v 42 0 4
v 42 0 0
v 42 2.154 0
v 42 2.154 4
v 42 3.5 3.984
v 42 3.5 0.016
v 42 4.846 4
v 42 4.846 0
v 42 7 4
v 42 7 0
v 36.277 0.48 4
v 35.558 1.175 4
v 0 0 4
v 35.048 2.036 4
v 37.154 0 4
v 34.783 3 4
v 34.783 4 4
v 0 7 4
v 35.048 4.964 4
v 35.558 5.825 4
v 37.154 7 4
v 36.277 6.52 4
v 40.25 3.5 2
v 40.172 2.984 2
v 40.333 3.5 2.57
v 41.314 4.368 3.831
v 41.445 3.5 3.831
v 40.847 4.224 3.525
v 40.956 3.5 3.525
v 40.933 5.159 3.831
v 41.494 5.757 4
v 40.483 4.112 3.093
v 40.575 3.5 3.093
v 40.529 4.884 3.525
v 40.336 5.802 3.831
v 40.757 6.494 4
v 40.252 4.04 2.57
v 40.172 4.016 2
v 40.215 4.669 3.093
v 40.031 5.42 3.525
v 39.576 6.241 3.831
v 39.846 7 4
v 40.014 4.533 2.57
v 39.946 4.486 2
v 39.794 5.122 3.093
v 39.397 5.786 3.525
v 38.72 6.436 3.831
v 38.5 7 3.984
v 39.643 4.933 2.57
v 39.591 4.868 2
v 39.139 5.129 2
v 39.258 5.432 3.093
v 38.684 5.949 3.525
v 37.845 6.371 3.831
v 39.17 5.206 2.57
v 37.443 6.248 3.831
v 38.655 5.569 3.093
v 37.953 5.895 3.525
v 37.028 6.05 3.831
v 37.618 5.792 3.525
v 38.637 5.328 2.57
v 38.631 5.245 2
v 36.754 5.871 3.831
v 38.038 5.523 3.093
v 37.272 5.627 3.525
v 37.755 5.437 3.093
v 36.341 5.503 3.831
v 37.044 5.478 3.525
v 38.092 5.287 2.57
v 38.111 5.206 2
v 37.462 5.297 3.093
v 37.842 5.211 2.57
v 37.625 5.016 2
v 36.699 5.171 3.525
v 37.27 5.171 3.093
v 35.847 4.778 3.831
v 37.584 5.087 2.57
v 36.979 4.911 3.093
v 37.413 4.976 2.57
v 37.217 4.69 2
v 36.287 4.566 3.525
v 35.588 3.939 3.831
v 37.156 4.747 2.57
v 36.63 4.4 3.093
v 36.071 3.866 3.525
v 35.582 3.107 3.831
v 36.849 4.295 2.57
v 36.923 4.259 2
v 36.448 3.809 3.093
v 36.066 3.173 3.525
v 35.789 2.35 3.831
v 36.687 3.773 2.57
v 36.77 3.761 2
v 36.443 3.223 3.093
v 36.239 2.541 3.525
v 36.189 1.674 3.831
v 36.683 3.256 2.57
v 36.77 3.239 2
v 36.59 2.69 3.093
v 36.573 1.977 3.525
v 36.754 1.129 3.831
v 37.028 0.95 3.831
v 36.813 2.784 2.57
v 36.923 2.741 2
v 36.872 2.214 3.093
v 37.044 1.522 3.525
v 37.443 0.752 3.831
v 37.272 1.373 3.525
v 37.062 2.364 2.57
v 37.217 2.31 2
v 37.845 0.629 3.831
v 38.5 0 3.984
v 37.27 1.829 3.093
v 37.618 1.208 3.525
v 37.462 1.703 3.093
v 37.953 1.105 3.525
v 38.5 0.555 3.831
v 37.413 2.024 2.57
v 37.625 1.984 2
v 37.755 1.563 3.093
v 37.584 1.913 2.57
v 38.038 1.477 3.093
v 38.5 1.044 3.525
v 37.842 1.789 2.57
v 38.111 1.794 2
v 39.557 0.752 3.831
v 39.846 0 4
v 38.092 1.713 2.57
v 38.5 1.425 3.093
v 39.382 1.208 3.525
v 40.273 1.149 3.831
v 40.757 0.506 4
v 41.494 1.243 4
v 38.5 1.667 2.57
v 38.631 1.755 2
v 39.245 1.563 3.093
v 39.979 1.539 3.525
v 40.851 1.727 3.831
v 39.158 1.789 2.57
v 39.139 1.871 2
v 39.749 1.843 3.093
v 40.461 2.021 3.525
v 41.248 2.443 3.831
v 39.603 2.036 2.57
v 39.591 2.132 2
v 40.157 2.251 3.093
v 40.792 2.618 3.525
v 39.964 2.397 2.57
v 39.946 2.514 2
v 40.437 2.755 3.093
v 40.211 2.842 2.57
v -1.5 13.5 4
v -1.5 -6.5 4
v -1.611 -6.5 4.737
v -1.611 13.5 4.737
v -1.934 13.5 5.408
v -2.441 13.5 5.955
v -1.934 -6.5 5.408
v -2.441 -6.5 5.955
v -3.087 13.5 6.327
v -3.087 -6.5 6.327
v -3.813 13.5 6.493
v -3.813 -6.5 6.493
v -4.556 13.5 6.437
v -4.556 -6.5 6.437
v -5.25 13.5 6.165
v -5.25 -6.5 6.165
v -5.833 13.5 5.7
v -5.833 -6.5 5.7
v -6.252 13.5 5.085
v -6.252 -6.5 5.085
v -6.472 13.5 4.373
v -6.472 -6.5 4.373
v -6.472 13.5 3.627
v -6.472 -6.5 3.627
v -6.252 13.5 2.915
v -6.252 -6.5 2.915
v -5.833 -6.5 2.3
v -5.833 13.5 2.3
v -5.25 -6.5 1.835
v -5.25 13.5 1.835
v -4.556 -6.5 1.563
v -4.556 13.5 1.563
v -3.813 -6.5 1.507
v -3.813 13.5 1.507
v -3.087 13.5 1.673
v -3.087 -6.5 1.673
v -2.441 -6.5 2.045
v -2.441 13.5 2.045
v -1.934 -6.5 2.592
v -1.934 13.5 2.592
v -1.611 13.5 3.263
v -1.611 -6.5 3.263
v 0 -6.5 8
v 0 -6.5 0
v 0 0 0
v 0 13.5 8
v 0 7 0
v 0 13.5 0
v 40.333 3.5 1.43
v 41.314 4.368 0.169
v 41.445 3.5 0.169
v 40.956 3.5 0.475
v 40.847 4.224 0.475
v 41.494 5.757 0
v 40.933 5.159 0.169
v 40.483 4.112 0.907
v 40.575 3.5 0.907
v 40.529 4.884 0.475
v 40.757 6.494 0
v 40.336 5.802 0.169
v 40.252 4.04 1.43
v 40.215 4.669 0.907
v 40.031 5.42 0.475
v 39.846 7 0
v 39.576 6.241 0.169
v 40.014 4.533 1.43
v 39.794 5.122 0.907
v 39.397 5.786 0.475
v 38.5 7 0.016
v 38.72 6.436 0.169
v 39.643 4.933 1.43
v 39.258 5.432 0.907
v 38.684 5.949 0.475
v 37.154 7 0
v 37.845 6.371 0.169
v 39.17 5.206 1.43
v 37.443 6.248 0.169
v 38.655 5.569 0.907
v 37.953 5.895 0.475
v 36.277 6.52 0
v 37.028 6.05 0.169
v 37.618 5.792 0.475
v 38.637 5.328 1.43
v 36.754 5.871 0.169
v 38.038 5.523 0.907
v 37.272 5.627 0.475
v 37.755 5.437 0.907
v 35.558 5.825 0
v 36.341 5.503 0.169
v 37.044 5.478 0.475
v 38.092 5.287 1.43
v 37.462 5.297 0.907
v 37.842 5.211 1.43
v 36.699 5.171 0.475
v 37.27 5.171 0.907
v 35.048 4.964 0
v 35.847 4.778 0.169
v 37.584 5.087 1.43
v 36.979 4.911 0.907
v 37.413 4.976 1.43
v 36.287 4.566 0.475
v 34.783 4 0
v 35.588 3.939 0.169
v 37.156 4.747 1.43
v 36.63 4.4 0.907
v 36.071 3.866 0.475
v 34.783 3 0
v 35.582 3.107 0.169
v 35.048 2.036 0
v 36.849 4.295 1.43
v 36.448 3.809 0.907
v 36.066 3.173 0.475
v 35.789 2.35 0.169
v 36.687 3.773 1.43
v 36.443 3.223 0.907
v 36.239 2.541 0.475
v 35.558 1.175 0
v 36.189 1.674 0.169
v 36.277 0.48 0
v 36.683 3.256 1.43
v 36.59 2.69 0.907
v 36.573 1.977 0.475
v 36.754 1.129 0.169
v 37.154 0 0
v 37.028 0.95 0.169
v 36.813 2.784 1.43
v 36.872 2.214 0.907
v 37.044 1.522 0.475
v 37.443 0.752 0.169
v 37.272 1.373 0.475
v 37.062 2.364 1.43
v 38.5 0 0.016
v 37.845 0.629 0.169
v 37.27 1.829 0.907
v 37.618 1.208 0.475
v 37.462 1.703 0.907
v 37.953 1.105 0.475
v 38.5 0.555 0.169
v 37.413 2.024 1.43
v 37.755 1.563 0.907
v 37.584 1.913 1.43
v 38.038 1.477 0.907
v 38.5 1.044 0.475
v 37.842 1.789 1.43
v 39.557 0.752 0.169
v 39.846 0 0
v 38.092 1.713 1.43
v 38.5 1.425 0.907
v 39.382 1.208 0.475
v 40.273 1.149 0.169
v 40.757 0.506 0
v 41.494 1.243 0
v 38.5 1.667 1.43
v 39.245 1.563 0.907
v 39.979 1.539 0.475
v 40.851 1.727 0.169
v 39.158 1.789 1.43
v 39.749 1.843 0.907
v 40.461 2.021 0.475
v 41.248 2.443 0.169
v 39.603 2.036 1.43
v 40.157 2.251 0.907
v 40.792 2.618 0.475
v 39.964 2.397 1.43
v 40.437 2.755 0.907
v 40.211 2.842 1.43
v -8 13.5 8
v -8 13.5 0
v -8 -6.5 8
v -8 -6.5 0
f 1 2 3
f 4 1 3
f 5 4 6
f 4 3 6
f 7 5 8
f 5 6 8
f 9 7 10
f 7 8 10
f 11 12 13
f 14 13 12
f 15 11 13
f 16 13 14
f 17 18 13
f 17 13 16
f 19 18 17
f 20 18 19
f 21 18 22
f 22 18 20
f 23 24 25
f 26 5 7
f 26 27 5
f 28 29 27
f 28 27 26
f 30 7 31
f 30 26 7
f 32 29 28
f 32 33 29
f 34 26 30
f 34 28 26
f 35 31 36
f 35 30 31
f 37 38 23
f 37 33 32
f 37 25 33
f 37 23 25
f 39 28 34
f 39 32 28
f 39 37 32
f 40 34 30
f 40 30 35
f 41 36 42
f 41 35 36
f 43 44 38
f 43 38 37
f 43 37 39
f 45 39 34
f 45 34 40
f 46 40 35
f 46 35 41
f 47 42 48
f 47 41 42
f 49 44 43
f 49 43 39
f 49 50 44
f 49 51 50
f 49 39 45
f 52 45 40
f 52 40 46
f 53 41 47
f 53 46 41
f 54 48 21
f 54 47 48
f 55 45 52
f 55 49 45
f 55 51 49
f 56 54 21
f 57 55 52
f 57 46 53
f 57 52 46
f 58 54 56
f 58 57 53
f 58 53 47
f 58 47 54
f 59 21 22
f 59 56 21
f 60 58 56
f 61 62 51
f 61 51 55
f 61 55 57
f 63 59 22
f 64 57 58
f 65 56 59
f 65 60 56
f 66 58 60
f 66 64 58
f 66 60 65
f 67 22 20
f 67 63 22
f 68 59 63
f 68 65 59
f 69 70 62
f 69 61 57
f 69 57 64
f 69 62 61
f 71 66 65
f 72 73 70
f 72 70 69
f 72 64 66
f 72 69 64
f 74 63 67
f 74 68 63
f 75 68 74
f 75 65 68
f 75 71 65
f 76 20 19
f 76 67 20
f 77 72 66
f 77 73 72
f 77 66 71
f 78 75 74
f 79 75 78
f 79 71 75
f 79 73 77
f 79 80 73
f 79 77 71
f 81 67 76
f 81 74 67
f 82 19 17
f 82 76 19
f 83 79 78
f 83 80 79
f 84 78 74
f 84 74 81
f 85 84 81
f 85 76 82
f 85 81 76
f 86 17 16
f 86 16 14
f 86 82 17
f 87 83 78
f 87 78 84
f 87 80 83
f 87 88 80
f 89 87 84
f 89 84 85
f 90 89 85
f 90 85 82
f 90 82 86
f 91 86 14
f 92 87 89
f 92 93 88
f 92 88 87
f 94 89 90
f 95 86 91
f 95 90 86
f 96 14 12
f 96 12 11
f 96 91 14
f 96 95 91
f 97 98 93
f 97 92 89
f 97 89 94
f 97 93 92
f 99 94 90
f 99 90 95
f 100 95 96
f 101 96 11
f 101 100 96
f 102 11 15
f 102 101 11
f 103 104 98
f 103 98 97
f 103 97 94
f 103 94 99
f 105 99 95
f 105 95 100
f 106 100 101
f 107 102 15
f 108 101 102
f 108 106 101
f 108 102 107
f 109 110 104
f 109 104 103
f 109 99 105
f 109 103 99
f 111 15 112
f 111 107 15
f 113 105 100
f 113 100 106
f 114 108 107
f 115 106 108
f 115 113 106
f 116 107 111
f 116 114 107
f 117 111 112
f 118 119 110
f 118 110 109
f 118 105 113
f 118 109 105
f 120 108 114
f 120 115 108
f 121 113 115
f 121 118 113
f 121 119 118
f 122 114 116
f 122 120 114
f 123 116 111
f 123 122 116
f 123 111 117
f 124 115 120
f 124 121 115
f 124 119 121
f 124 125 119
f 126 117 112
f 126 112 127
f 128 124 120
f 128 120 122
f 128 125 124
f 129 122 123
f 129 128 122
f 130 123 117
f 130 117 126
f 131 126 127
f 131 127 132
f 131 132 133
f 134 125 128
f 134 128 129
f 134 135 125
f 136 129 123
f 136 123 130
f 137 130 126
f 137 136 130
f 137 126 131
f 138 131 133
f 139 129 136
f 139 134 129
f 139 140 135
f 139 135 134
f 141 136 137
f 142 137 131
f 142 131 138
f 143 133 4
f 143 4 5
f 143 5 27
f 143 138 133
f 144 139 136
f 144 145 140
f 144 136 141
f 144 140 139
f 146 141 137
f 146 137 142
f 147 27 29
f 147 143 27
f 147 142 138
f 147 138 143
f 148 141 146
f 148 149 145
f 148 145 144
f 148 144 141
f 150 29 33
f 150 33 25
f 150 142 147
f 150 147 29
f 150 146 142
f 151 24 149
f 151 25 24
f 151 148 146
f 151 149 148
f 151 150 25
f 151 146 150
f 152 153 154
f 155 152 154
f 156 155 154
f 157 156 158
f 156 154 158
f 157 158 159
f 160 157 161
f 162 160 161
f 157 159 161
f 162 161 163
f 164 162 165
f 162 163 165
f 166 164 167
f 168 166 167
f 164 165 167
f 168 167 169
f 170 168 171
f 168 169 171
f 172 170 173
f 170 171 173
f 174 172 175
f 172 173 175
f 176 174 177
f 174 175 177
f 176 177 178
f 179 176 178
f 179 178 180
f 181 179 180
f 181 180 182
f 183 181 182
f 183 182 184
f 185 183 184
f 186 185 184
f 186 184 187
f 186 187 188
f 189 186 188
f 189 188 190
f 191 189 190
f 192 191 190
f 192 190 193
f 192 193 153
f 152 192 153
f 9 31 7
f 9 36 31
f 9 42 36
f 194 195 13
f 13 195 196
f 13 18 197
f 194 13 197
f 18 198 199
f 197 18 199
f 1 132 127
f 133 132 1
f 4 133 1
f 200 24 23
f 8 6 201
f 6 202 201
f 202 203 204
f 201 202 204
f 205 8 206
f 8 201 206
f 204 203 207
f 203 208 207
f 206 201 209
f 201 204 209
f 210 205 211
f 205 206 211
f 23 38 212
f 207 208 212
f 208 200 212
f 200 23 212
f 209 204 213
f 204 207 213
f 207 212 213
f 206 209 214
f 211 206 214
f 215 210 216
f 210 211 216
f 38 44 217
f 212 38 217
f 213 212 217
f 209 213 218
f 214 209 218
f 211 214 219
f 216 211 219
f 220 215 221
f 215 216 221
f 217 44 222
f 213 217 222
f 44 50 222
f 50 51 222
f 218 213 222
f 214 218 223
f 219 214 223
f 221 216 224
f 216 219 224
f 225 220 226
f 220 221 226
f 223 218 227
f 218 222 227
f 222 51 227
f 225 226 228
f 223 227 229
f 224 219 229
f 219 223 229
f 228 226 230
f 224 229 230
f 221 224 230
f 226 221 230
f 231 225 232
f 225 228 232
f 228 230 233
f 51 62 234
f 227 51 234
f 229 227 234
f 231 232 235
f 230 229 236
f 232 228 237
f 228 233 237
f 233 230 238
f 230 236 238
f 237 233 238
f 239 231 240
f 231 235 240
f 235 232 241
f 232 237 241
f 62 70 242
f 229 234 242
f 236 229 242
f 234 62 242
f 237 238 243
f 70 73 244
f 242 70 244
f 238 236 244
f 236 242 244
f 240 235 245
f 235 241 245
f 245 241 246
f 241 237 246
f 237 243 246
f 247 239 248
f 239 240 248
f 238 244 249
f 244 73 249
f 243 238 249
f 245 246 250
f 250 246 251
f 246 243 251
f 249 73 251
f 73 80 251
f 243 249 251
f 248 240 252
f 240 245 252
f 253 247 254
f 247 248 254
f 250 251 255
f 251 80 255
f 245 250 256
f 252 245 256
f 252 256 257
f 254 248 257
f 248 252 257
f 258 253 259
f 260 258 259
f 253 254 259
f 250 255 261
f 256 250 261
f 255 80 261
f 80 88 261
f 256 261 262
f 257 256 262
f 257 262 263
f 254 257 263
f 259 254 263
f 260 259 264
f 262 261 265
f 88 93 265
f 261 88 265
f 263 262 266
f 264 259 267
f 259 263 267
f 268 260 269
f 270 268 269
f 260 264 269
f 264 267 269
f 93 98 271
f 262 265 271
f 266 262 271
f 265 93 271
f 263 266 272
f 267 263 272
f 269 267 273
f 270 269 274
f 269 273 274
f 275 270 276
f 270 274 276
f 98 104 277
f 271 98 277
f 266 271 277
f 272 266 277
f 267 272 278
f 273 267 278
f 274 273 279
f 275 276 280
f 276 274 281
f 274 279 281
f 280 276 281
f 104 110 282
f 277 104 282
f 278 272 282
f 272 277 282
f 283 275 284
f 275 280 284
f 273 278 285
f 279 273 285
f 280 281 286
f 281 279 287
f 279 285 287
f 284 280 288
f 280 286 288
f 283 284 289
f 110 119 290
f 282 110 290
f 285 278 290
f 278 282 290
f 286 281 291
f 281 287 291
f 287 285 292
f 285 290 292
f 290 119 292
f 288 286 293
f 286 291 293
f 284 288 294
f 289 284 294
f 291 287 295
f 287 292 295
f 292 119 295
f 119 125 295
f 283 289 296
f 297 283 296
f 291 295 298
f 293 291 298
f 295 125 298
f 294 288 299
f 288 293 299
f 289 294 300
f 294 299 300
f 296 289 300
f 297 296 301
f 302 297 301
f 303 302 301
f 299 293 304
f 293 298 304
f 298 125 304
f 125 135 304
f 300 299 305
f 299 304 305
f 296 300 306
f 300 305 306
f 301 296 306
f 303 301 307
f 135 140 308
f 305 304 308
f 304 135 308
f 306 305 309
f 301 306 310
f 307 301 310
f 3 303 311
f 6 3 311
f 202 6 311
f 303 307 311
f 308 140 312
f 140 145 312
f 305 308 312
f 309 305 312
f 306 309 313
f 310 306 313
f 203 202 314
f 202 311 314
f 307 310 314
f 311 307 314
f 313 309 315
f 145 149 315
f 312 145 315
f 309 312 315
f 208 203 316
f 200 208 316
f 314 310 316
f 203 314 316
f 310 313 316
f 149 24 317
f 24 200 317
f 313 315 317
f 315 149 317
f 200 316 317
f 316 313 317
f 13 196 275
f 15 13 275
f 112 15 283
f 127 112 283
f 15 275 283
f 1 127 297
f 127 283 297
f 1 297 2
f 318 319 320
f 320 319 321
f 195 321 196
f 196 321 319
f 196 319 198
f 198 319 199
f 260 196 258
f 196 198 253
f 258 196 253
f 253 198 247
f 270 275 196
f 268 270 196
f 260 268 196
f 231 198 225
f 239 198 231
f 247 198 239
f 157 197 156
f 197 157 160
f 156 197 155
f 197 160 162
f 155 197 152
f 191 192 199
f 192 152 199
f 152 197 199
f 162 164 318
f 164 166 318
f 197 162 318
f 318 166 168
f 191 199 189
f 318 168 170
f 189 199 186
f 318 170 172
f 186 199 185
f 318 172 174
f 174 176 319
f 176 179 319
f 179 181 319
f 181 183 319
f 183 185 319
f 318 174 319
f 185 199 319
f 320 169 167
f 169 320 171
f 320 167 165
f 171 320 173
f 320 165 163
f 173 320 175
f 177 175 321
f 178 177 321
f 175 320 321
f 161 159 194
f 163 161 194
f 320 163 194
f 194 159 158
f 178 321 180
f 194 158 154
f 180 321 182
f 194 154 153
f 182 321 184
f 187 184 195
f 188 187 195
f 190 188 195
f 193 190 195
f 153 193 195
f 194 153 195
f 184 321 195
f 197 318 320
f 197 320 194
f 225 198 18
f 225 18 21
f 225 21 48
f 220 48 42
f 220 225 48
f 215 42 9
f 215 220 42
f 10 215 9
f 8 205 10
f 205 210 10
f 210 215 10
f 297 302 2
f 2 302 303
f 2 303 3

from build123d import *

# Parameters (mm, degrees)
F1_DEPTH = 8
F0_W     = 42
F0_H     = 7
F0_R     = 1.75
F2_DEPTH = 4
F4_R     = 2.5
F5_DEPTH = 20.001


# Not quite as in the source:
# - a fillet or chamfer that OpenCascade refuses, or shapes differently, is made with other operations: its cross-section is extruded or revolved along the edge and cut away or added


with BuildPart() as f1:
    # F0 (on Top) → F1 (new body)
    with BuildSketch(Plane.XY):
        Polygon((0, -6.5), (0, 0), (0, 7), (0, 13.5), (-8, 13.5), (-8, -6.5), align=None)
    extrude(amount=F1_DEPTH)

    # F0 (on Top) → F2 (join)
    with BuildSketch(Plane.XY):
        with Locations((21, 3.5)):
            Rectangle(F0_W, F0_H)
        with Locations((38.5, 3.5)):
            Circle(F0_R, mode=Mode.SUBTRACT)
    extrude(amount=F2_DEPTH)

    # F3: fillet of radius 2 on 2 edges, made by hand

    # F3_s1 → F3_t2 (revolve, cut)
    with BuildSketch(Plane.XZ.offset(-3.5)):
        with BuildLine():
            ThreePointArc((42.25, 4), (40.8357864376, 3.4142135624), (40.25, 2))
            Line((40.25, 2), (40.25, 4))
            Line((40.25, 4), (42.25, 4))
        make_face()
    revolve(axis=Axis((38.5, 3.5, 4), (0, 0, 1)), mode=Mode.SUBTRACT)

    # F3_s3 → F3_t4 (revolve, cut)
    with BuildSketch(Plane.XZ.offset(-3.5)):
        with BuildLine():
            ThreePointArc((42.25, 0), (40.8357864376, 0.5857864376), (40.25, 2))
            Line((40.25, 2), (40.25, 0))
            Line((40.25, 0), (42.25, 0))
        make_face()
    revolve(axis=Axis((38.5, 3.5, 0), (0, 0, 1)), mode=Mode.SUBTRACT)

    # F4 (on face) → F5 (cut, through all)
    with BuildSketch(Plane.XZ.offset(6.5)):
        with Locations((-4, 4)):
            Circle(F4_R)
    extrude(amount=-F5_DEPTH, mode=Mode.SUBTRACT)


solid = f1.part
